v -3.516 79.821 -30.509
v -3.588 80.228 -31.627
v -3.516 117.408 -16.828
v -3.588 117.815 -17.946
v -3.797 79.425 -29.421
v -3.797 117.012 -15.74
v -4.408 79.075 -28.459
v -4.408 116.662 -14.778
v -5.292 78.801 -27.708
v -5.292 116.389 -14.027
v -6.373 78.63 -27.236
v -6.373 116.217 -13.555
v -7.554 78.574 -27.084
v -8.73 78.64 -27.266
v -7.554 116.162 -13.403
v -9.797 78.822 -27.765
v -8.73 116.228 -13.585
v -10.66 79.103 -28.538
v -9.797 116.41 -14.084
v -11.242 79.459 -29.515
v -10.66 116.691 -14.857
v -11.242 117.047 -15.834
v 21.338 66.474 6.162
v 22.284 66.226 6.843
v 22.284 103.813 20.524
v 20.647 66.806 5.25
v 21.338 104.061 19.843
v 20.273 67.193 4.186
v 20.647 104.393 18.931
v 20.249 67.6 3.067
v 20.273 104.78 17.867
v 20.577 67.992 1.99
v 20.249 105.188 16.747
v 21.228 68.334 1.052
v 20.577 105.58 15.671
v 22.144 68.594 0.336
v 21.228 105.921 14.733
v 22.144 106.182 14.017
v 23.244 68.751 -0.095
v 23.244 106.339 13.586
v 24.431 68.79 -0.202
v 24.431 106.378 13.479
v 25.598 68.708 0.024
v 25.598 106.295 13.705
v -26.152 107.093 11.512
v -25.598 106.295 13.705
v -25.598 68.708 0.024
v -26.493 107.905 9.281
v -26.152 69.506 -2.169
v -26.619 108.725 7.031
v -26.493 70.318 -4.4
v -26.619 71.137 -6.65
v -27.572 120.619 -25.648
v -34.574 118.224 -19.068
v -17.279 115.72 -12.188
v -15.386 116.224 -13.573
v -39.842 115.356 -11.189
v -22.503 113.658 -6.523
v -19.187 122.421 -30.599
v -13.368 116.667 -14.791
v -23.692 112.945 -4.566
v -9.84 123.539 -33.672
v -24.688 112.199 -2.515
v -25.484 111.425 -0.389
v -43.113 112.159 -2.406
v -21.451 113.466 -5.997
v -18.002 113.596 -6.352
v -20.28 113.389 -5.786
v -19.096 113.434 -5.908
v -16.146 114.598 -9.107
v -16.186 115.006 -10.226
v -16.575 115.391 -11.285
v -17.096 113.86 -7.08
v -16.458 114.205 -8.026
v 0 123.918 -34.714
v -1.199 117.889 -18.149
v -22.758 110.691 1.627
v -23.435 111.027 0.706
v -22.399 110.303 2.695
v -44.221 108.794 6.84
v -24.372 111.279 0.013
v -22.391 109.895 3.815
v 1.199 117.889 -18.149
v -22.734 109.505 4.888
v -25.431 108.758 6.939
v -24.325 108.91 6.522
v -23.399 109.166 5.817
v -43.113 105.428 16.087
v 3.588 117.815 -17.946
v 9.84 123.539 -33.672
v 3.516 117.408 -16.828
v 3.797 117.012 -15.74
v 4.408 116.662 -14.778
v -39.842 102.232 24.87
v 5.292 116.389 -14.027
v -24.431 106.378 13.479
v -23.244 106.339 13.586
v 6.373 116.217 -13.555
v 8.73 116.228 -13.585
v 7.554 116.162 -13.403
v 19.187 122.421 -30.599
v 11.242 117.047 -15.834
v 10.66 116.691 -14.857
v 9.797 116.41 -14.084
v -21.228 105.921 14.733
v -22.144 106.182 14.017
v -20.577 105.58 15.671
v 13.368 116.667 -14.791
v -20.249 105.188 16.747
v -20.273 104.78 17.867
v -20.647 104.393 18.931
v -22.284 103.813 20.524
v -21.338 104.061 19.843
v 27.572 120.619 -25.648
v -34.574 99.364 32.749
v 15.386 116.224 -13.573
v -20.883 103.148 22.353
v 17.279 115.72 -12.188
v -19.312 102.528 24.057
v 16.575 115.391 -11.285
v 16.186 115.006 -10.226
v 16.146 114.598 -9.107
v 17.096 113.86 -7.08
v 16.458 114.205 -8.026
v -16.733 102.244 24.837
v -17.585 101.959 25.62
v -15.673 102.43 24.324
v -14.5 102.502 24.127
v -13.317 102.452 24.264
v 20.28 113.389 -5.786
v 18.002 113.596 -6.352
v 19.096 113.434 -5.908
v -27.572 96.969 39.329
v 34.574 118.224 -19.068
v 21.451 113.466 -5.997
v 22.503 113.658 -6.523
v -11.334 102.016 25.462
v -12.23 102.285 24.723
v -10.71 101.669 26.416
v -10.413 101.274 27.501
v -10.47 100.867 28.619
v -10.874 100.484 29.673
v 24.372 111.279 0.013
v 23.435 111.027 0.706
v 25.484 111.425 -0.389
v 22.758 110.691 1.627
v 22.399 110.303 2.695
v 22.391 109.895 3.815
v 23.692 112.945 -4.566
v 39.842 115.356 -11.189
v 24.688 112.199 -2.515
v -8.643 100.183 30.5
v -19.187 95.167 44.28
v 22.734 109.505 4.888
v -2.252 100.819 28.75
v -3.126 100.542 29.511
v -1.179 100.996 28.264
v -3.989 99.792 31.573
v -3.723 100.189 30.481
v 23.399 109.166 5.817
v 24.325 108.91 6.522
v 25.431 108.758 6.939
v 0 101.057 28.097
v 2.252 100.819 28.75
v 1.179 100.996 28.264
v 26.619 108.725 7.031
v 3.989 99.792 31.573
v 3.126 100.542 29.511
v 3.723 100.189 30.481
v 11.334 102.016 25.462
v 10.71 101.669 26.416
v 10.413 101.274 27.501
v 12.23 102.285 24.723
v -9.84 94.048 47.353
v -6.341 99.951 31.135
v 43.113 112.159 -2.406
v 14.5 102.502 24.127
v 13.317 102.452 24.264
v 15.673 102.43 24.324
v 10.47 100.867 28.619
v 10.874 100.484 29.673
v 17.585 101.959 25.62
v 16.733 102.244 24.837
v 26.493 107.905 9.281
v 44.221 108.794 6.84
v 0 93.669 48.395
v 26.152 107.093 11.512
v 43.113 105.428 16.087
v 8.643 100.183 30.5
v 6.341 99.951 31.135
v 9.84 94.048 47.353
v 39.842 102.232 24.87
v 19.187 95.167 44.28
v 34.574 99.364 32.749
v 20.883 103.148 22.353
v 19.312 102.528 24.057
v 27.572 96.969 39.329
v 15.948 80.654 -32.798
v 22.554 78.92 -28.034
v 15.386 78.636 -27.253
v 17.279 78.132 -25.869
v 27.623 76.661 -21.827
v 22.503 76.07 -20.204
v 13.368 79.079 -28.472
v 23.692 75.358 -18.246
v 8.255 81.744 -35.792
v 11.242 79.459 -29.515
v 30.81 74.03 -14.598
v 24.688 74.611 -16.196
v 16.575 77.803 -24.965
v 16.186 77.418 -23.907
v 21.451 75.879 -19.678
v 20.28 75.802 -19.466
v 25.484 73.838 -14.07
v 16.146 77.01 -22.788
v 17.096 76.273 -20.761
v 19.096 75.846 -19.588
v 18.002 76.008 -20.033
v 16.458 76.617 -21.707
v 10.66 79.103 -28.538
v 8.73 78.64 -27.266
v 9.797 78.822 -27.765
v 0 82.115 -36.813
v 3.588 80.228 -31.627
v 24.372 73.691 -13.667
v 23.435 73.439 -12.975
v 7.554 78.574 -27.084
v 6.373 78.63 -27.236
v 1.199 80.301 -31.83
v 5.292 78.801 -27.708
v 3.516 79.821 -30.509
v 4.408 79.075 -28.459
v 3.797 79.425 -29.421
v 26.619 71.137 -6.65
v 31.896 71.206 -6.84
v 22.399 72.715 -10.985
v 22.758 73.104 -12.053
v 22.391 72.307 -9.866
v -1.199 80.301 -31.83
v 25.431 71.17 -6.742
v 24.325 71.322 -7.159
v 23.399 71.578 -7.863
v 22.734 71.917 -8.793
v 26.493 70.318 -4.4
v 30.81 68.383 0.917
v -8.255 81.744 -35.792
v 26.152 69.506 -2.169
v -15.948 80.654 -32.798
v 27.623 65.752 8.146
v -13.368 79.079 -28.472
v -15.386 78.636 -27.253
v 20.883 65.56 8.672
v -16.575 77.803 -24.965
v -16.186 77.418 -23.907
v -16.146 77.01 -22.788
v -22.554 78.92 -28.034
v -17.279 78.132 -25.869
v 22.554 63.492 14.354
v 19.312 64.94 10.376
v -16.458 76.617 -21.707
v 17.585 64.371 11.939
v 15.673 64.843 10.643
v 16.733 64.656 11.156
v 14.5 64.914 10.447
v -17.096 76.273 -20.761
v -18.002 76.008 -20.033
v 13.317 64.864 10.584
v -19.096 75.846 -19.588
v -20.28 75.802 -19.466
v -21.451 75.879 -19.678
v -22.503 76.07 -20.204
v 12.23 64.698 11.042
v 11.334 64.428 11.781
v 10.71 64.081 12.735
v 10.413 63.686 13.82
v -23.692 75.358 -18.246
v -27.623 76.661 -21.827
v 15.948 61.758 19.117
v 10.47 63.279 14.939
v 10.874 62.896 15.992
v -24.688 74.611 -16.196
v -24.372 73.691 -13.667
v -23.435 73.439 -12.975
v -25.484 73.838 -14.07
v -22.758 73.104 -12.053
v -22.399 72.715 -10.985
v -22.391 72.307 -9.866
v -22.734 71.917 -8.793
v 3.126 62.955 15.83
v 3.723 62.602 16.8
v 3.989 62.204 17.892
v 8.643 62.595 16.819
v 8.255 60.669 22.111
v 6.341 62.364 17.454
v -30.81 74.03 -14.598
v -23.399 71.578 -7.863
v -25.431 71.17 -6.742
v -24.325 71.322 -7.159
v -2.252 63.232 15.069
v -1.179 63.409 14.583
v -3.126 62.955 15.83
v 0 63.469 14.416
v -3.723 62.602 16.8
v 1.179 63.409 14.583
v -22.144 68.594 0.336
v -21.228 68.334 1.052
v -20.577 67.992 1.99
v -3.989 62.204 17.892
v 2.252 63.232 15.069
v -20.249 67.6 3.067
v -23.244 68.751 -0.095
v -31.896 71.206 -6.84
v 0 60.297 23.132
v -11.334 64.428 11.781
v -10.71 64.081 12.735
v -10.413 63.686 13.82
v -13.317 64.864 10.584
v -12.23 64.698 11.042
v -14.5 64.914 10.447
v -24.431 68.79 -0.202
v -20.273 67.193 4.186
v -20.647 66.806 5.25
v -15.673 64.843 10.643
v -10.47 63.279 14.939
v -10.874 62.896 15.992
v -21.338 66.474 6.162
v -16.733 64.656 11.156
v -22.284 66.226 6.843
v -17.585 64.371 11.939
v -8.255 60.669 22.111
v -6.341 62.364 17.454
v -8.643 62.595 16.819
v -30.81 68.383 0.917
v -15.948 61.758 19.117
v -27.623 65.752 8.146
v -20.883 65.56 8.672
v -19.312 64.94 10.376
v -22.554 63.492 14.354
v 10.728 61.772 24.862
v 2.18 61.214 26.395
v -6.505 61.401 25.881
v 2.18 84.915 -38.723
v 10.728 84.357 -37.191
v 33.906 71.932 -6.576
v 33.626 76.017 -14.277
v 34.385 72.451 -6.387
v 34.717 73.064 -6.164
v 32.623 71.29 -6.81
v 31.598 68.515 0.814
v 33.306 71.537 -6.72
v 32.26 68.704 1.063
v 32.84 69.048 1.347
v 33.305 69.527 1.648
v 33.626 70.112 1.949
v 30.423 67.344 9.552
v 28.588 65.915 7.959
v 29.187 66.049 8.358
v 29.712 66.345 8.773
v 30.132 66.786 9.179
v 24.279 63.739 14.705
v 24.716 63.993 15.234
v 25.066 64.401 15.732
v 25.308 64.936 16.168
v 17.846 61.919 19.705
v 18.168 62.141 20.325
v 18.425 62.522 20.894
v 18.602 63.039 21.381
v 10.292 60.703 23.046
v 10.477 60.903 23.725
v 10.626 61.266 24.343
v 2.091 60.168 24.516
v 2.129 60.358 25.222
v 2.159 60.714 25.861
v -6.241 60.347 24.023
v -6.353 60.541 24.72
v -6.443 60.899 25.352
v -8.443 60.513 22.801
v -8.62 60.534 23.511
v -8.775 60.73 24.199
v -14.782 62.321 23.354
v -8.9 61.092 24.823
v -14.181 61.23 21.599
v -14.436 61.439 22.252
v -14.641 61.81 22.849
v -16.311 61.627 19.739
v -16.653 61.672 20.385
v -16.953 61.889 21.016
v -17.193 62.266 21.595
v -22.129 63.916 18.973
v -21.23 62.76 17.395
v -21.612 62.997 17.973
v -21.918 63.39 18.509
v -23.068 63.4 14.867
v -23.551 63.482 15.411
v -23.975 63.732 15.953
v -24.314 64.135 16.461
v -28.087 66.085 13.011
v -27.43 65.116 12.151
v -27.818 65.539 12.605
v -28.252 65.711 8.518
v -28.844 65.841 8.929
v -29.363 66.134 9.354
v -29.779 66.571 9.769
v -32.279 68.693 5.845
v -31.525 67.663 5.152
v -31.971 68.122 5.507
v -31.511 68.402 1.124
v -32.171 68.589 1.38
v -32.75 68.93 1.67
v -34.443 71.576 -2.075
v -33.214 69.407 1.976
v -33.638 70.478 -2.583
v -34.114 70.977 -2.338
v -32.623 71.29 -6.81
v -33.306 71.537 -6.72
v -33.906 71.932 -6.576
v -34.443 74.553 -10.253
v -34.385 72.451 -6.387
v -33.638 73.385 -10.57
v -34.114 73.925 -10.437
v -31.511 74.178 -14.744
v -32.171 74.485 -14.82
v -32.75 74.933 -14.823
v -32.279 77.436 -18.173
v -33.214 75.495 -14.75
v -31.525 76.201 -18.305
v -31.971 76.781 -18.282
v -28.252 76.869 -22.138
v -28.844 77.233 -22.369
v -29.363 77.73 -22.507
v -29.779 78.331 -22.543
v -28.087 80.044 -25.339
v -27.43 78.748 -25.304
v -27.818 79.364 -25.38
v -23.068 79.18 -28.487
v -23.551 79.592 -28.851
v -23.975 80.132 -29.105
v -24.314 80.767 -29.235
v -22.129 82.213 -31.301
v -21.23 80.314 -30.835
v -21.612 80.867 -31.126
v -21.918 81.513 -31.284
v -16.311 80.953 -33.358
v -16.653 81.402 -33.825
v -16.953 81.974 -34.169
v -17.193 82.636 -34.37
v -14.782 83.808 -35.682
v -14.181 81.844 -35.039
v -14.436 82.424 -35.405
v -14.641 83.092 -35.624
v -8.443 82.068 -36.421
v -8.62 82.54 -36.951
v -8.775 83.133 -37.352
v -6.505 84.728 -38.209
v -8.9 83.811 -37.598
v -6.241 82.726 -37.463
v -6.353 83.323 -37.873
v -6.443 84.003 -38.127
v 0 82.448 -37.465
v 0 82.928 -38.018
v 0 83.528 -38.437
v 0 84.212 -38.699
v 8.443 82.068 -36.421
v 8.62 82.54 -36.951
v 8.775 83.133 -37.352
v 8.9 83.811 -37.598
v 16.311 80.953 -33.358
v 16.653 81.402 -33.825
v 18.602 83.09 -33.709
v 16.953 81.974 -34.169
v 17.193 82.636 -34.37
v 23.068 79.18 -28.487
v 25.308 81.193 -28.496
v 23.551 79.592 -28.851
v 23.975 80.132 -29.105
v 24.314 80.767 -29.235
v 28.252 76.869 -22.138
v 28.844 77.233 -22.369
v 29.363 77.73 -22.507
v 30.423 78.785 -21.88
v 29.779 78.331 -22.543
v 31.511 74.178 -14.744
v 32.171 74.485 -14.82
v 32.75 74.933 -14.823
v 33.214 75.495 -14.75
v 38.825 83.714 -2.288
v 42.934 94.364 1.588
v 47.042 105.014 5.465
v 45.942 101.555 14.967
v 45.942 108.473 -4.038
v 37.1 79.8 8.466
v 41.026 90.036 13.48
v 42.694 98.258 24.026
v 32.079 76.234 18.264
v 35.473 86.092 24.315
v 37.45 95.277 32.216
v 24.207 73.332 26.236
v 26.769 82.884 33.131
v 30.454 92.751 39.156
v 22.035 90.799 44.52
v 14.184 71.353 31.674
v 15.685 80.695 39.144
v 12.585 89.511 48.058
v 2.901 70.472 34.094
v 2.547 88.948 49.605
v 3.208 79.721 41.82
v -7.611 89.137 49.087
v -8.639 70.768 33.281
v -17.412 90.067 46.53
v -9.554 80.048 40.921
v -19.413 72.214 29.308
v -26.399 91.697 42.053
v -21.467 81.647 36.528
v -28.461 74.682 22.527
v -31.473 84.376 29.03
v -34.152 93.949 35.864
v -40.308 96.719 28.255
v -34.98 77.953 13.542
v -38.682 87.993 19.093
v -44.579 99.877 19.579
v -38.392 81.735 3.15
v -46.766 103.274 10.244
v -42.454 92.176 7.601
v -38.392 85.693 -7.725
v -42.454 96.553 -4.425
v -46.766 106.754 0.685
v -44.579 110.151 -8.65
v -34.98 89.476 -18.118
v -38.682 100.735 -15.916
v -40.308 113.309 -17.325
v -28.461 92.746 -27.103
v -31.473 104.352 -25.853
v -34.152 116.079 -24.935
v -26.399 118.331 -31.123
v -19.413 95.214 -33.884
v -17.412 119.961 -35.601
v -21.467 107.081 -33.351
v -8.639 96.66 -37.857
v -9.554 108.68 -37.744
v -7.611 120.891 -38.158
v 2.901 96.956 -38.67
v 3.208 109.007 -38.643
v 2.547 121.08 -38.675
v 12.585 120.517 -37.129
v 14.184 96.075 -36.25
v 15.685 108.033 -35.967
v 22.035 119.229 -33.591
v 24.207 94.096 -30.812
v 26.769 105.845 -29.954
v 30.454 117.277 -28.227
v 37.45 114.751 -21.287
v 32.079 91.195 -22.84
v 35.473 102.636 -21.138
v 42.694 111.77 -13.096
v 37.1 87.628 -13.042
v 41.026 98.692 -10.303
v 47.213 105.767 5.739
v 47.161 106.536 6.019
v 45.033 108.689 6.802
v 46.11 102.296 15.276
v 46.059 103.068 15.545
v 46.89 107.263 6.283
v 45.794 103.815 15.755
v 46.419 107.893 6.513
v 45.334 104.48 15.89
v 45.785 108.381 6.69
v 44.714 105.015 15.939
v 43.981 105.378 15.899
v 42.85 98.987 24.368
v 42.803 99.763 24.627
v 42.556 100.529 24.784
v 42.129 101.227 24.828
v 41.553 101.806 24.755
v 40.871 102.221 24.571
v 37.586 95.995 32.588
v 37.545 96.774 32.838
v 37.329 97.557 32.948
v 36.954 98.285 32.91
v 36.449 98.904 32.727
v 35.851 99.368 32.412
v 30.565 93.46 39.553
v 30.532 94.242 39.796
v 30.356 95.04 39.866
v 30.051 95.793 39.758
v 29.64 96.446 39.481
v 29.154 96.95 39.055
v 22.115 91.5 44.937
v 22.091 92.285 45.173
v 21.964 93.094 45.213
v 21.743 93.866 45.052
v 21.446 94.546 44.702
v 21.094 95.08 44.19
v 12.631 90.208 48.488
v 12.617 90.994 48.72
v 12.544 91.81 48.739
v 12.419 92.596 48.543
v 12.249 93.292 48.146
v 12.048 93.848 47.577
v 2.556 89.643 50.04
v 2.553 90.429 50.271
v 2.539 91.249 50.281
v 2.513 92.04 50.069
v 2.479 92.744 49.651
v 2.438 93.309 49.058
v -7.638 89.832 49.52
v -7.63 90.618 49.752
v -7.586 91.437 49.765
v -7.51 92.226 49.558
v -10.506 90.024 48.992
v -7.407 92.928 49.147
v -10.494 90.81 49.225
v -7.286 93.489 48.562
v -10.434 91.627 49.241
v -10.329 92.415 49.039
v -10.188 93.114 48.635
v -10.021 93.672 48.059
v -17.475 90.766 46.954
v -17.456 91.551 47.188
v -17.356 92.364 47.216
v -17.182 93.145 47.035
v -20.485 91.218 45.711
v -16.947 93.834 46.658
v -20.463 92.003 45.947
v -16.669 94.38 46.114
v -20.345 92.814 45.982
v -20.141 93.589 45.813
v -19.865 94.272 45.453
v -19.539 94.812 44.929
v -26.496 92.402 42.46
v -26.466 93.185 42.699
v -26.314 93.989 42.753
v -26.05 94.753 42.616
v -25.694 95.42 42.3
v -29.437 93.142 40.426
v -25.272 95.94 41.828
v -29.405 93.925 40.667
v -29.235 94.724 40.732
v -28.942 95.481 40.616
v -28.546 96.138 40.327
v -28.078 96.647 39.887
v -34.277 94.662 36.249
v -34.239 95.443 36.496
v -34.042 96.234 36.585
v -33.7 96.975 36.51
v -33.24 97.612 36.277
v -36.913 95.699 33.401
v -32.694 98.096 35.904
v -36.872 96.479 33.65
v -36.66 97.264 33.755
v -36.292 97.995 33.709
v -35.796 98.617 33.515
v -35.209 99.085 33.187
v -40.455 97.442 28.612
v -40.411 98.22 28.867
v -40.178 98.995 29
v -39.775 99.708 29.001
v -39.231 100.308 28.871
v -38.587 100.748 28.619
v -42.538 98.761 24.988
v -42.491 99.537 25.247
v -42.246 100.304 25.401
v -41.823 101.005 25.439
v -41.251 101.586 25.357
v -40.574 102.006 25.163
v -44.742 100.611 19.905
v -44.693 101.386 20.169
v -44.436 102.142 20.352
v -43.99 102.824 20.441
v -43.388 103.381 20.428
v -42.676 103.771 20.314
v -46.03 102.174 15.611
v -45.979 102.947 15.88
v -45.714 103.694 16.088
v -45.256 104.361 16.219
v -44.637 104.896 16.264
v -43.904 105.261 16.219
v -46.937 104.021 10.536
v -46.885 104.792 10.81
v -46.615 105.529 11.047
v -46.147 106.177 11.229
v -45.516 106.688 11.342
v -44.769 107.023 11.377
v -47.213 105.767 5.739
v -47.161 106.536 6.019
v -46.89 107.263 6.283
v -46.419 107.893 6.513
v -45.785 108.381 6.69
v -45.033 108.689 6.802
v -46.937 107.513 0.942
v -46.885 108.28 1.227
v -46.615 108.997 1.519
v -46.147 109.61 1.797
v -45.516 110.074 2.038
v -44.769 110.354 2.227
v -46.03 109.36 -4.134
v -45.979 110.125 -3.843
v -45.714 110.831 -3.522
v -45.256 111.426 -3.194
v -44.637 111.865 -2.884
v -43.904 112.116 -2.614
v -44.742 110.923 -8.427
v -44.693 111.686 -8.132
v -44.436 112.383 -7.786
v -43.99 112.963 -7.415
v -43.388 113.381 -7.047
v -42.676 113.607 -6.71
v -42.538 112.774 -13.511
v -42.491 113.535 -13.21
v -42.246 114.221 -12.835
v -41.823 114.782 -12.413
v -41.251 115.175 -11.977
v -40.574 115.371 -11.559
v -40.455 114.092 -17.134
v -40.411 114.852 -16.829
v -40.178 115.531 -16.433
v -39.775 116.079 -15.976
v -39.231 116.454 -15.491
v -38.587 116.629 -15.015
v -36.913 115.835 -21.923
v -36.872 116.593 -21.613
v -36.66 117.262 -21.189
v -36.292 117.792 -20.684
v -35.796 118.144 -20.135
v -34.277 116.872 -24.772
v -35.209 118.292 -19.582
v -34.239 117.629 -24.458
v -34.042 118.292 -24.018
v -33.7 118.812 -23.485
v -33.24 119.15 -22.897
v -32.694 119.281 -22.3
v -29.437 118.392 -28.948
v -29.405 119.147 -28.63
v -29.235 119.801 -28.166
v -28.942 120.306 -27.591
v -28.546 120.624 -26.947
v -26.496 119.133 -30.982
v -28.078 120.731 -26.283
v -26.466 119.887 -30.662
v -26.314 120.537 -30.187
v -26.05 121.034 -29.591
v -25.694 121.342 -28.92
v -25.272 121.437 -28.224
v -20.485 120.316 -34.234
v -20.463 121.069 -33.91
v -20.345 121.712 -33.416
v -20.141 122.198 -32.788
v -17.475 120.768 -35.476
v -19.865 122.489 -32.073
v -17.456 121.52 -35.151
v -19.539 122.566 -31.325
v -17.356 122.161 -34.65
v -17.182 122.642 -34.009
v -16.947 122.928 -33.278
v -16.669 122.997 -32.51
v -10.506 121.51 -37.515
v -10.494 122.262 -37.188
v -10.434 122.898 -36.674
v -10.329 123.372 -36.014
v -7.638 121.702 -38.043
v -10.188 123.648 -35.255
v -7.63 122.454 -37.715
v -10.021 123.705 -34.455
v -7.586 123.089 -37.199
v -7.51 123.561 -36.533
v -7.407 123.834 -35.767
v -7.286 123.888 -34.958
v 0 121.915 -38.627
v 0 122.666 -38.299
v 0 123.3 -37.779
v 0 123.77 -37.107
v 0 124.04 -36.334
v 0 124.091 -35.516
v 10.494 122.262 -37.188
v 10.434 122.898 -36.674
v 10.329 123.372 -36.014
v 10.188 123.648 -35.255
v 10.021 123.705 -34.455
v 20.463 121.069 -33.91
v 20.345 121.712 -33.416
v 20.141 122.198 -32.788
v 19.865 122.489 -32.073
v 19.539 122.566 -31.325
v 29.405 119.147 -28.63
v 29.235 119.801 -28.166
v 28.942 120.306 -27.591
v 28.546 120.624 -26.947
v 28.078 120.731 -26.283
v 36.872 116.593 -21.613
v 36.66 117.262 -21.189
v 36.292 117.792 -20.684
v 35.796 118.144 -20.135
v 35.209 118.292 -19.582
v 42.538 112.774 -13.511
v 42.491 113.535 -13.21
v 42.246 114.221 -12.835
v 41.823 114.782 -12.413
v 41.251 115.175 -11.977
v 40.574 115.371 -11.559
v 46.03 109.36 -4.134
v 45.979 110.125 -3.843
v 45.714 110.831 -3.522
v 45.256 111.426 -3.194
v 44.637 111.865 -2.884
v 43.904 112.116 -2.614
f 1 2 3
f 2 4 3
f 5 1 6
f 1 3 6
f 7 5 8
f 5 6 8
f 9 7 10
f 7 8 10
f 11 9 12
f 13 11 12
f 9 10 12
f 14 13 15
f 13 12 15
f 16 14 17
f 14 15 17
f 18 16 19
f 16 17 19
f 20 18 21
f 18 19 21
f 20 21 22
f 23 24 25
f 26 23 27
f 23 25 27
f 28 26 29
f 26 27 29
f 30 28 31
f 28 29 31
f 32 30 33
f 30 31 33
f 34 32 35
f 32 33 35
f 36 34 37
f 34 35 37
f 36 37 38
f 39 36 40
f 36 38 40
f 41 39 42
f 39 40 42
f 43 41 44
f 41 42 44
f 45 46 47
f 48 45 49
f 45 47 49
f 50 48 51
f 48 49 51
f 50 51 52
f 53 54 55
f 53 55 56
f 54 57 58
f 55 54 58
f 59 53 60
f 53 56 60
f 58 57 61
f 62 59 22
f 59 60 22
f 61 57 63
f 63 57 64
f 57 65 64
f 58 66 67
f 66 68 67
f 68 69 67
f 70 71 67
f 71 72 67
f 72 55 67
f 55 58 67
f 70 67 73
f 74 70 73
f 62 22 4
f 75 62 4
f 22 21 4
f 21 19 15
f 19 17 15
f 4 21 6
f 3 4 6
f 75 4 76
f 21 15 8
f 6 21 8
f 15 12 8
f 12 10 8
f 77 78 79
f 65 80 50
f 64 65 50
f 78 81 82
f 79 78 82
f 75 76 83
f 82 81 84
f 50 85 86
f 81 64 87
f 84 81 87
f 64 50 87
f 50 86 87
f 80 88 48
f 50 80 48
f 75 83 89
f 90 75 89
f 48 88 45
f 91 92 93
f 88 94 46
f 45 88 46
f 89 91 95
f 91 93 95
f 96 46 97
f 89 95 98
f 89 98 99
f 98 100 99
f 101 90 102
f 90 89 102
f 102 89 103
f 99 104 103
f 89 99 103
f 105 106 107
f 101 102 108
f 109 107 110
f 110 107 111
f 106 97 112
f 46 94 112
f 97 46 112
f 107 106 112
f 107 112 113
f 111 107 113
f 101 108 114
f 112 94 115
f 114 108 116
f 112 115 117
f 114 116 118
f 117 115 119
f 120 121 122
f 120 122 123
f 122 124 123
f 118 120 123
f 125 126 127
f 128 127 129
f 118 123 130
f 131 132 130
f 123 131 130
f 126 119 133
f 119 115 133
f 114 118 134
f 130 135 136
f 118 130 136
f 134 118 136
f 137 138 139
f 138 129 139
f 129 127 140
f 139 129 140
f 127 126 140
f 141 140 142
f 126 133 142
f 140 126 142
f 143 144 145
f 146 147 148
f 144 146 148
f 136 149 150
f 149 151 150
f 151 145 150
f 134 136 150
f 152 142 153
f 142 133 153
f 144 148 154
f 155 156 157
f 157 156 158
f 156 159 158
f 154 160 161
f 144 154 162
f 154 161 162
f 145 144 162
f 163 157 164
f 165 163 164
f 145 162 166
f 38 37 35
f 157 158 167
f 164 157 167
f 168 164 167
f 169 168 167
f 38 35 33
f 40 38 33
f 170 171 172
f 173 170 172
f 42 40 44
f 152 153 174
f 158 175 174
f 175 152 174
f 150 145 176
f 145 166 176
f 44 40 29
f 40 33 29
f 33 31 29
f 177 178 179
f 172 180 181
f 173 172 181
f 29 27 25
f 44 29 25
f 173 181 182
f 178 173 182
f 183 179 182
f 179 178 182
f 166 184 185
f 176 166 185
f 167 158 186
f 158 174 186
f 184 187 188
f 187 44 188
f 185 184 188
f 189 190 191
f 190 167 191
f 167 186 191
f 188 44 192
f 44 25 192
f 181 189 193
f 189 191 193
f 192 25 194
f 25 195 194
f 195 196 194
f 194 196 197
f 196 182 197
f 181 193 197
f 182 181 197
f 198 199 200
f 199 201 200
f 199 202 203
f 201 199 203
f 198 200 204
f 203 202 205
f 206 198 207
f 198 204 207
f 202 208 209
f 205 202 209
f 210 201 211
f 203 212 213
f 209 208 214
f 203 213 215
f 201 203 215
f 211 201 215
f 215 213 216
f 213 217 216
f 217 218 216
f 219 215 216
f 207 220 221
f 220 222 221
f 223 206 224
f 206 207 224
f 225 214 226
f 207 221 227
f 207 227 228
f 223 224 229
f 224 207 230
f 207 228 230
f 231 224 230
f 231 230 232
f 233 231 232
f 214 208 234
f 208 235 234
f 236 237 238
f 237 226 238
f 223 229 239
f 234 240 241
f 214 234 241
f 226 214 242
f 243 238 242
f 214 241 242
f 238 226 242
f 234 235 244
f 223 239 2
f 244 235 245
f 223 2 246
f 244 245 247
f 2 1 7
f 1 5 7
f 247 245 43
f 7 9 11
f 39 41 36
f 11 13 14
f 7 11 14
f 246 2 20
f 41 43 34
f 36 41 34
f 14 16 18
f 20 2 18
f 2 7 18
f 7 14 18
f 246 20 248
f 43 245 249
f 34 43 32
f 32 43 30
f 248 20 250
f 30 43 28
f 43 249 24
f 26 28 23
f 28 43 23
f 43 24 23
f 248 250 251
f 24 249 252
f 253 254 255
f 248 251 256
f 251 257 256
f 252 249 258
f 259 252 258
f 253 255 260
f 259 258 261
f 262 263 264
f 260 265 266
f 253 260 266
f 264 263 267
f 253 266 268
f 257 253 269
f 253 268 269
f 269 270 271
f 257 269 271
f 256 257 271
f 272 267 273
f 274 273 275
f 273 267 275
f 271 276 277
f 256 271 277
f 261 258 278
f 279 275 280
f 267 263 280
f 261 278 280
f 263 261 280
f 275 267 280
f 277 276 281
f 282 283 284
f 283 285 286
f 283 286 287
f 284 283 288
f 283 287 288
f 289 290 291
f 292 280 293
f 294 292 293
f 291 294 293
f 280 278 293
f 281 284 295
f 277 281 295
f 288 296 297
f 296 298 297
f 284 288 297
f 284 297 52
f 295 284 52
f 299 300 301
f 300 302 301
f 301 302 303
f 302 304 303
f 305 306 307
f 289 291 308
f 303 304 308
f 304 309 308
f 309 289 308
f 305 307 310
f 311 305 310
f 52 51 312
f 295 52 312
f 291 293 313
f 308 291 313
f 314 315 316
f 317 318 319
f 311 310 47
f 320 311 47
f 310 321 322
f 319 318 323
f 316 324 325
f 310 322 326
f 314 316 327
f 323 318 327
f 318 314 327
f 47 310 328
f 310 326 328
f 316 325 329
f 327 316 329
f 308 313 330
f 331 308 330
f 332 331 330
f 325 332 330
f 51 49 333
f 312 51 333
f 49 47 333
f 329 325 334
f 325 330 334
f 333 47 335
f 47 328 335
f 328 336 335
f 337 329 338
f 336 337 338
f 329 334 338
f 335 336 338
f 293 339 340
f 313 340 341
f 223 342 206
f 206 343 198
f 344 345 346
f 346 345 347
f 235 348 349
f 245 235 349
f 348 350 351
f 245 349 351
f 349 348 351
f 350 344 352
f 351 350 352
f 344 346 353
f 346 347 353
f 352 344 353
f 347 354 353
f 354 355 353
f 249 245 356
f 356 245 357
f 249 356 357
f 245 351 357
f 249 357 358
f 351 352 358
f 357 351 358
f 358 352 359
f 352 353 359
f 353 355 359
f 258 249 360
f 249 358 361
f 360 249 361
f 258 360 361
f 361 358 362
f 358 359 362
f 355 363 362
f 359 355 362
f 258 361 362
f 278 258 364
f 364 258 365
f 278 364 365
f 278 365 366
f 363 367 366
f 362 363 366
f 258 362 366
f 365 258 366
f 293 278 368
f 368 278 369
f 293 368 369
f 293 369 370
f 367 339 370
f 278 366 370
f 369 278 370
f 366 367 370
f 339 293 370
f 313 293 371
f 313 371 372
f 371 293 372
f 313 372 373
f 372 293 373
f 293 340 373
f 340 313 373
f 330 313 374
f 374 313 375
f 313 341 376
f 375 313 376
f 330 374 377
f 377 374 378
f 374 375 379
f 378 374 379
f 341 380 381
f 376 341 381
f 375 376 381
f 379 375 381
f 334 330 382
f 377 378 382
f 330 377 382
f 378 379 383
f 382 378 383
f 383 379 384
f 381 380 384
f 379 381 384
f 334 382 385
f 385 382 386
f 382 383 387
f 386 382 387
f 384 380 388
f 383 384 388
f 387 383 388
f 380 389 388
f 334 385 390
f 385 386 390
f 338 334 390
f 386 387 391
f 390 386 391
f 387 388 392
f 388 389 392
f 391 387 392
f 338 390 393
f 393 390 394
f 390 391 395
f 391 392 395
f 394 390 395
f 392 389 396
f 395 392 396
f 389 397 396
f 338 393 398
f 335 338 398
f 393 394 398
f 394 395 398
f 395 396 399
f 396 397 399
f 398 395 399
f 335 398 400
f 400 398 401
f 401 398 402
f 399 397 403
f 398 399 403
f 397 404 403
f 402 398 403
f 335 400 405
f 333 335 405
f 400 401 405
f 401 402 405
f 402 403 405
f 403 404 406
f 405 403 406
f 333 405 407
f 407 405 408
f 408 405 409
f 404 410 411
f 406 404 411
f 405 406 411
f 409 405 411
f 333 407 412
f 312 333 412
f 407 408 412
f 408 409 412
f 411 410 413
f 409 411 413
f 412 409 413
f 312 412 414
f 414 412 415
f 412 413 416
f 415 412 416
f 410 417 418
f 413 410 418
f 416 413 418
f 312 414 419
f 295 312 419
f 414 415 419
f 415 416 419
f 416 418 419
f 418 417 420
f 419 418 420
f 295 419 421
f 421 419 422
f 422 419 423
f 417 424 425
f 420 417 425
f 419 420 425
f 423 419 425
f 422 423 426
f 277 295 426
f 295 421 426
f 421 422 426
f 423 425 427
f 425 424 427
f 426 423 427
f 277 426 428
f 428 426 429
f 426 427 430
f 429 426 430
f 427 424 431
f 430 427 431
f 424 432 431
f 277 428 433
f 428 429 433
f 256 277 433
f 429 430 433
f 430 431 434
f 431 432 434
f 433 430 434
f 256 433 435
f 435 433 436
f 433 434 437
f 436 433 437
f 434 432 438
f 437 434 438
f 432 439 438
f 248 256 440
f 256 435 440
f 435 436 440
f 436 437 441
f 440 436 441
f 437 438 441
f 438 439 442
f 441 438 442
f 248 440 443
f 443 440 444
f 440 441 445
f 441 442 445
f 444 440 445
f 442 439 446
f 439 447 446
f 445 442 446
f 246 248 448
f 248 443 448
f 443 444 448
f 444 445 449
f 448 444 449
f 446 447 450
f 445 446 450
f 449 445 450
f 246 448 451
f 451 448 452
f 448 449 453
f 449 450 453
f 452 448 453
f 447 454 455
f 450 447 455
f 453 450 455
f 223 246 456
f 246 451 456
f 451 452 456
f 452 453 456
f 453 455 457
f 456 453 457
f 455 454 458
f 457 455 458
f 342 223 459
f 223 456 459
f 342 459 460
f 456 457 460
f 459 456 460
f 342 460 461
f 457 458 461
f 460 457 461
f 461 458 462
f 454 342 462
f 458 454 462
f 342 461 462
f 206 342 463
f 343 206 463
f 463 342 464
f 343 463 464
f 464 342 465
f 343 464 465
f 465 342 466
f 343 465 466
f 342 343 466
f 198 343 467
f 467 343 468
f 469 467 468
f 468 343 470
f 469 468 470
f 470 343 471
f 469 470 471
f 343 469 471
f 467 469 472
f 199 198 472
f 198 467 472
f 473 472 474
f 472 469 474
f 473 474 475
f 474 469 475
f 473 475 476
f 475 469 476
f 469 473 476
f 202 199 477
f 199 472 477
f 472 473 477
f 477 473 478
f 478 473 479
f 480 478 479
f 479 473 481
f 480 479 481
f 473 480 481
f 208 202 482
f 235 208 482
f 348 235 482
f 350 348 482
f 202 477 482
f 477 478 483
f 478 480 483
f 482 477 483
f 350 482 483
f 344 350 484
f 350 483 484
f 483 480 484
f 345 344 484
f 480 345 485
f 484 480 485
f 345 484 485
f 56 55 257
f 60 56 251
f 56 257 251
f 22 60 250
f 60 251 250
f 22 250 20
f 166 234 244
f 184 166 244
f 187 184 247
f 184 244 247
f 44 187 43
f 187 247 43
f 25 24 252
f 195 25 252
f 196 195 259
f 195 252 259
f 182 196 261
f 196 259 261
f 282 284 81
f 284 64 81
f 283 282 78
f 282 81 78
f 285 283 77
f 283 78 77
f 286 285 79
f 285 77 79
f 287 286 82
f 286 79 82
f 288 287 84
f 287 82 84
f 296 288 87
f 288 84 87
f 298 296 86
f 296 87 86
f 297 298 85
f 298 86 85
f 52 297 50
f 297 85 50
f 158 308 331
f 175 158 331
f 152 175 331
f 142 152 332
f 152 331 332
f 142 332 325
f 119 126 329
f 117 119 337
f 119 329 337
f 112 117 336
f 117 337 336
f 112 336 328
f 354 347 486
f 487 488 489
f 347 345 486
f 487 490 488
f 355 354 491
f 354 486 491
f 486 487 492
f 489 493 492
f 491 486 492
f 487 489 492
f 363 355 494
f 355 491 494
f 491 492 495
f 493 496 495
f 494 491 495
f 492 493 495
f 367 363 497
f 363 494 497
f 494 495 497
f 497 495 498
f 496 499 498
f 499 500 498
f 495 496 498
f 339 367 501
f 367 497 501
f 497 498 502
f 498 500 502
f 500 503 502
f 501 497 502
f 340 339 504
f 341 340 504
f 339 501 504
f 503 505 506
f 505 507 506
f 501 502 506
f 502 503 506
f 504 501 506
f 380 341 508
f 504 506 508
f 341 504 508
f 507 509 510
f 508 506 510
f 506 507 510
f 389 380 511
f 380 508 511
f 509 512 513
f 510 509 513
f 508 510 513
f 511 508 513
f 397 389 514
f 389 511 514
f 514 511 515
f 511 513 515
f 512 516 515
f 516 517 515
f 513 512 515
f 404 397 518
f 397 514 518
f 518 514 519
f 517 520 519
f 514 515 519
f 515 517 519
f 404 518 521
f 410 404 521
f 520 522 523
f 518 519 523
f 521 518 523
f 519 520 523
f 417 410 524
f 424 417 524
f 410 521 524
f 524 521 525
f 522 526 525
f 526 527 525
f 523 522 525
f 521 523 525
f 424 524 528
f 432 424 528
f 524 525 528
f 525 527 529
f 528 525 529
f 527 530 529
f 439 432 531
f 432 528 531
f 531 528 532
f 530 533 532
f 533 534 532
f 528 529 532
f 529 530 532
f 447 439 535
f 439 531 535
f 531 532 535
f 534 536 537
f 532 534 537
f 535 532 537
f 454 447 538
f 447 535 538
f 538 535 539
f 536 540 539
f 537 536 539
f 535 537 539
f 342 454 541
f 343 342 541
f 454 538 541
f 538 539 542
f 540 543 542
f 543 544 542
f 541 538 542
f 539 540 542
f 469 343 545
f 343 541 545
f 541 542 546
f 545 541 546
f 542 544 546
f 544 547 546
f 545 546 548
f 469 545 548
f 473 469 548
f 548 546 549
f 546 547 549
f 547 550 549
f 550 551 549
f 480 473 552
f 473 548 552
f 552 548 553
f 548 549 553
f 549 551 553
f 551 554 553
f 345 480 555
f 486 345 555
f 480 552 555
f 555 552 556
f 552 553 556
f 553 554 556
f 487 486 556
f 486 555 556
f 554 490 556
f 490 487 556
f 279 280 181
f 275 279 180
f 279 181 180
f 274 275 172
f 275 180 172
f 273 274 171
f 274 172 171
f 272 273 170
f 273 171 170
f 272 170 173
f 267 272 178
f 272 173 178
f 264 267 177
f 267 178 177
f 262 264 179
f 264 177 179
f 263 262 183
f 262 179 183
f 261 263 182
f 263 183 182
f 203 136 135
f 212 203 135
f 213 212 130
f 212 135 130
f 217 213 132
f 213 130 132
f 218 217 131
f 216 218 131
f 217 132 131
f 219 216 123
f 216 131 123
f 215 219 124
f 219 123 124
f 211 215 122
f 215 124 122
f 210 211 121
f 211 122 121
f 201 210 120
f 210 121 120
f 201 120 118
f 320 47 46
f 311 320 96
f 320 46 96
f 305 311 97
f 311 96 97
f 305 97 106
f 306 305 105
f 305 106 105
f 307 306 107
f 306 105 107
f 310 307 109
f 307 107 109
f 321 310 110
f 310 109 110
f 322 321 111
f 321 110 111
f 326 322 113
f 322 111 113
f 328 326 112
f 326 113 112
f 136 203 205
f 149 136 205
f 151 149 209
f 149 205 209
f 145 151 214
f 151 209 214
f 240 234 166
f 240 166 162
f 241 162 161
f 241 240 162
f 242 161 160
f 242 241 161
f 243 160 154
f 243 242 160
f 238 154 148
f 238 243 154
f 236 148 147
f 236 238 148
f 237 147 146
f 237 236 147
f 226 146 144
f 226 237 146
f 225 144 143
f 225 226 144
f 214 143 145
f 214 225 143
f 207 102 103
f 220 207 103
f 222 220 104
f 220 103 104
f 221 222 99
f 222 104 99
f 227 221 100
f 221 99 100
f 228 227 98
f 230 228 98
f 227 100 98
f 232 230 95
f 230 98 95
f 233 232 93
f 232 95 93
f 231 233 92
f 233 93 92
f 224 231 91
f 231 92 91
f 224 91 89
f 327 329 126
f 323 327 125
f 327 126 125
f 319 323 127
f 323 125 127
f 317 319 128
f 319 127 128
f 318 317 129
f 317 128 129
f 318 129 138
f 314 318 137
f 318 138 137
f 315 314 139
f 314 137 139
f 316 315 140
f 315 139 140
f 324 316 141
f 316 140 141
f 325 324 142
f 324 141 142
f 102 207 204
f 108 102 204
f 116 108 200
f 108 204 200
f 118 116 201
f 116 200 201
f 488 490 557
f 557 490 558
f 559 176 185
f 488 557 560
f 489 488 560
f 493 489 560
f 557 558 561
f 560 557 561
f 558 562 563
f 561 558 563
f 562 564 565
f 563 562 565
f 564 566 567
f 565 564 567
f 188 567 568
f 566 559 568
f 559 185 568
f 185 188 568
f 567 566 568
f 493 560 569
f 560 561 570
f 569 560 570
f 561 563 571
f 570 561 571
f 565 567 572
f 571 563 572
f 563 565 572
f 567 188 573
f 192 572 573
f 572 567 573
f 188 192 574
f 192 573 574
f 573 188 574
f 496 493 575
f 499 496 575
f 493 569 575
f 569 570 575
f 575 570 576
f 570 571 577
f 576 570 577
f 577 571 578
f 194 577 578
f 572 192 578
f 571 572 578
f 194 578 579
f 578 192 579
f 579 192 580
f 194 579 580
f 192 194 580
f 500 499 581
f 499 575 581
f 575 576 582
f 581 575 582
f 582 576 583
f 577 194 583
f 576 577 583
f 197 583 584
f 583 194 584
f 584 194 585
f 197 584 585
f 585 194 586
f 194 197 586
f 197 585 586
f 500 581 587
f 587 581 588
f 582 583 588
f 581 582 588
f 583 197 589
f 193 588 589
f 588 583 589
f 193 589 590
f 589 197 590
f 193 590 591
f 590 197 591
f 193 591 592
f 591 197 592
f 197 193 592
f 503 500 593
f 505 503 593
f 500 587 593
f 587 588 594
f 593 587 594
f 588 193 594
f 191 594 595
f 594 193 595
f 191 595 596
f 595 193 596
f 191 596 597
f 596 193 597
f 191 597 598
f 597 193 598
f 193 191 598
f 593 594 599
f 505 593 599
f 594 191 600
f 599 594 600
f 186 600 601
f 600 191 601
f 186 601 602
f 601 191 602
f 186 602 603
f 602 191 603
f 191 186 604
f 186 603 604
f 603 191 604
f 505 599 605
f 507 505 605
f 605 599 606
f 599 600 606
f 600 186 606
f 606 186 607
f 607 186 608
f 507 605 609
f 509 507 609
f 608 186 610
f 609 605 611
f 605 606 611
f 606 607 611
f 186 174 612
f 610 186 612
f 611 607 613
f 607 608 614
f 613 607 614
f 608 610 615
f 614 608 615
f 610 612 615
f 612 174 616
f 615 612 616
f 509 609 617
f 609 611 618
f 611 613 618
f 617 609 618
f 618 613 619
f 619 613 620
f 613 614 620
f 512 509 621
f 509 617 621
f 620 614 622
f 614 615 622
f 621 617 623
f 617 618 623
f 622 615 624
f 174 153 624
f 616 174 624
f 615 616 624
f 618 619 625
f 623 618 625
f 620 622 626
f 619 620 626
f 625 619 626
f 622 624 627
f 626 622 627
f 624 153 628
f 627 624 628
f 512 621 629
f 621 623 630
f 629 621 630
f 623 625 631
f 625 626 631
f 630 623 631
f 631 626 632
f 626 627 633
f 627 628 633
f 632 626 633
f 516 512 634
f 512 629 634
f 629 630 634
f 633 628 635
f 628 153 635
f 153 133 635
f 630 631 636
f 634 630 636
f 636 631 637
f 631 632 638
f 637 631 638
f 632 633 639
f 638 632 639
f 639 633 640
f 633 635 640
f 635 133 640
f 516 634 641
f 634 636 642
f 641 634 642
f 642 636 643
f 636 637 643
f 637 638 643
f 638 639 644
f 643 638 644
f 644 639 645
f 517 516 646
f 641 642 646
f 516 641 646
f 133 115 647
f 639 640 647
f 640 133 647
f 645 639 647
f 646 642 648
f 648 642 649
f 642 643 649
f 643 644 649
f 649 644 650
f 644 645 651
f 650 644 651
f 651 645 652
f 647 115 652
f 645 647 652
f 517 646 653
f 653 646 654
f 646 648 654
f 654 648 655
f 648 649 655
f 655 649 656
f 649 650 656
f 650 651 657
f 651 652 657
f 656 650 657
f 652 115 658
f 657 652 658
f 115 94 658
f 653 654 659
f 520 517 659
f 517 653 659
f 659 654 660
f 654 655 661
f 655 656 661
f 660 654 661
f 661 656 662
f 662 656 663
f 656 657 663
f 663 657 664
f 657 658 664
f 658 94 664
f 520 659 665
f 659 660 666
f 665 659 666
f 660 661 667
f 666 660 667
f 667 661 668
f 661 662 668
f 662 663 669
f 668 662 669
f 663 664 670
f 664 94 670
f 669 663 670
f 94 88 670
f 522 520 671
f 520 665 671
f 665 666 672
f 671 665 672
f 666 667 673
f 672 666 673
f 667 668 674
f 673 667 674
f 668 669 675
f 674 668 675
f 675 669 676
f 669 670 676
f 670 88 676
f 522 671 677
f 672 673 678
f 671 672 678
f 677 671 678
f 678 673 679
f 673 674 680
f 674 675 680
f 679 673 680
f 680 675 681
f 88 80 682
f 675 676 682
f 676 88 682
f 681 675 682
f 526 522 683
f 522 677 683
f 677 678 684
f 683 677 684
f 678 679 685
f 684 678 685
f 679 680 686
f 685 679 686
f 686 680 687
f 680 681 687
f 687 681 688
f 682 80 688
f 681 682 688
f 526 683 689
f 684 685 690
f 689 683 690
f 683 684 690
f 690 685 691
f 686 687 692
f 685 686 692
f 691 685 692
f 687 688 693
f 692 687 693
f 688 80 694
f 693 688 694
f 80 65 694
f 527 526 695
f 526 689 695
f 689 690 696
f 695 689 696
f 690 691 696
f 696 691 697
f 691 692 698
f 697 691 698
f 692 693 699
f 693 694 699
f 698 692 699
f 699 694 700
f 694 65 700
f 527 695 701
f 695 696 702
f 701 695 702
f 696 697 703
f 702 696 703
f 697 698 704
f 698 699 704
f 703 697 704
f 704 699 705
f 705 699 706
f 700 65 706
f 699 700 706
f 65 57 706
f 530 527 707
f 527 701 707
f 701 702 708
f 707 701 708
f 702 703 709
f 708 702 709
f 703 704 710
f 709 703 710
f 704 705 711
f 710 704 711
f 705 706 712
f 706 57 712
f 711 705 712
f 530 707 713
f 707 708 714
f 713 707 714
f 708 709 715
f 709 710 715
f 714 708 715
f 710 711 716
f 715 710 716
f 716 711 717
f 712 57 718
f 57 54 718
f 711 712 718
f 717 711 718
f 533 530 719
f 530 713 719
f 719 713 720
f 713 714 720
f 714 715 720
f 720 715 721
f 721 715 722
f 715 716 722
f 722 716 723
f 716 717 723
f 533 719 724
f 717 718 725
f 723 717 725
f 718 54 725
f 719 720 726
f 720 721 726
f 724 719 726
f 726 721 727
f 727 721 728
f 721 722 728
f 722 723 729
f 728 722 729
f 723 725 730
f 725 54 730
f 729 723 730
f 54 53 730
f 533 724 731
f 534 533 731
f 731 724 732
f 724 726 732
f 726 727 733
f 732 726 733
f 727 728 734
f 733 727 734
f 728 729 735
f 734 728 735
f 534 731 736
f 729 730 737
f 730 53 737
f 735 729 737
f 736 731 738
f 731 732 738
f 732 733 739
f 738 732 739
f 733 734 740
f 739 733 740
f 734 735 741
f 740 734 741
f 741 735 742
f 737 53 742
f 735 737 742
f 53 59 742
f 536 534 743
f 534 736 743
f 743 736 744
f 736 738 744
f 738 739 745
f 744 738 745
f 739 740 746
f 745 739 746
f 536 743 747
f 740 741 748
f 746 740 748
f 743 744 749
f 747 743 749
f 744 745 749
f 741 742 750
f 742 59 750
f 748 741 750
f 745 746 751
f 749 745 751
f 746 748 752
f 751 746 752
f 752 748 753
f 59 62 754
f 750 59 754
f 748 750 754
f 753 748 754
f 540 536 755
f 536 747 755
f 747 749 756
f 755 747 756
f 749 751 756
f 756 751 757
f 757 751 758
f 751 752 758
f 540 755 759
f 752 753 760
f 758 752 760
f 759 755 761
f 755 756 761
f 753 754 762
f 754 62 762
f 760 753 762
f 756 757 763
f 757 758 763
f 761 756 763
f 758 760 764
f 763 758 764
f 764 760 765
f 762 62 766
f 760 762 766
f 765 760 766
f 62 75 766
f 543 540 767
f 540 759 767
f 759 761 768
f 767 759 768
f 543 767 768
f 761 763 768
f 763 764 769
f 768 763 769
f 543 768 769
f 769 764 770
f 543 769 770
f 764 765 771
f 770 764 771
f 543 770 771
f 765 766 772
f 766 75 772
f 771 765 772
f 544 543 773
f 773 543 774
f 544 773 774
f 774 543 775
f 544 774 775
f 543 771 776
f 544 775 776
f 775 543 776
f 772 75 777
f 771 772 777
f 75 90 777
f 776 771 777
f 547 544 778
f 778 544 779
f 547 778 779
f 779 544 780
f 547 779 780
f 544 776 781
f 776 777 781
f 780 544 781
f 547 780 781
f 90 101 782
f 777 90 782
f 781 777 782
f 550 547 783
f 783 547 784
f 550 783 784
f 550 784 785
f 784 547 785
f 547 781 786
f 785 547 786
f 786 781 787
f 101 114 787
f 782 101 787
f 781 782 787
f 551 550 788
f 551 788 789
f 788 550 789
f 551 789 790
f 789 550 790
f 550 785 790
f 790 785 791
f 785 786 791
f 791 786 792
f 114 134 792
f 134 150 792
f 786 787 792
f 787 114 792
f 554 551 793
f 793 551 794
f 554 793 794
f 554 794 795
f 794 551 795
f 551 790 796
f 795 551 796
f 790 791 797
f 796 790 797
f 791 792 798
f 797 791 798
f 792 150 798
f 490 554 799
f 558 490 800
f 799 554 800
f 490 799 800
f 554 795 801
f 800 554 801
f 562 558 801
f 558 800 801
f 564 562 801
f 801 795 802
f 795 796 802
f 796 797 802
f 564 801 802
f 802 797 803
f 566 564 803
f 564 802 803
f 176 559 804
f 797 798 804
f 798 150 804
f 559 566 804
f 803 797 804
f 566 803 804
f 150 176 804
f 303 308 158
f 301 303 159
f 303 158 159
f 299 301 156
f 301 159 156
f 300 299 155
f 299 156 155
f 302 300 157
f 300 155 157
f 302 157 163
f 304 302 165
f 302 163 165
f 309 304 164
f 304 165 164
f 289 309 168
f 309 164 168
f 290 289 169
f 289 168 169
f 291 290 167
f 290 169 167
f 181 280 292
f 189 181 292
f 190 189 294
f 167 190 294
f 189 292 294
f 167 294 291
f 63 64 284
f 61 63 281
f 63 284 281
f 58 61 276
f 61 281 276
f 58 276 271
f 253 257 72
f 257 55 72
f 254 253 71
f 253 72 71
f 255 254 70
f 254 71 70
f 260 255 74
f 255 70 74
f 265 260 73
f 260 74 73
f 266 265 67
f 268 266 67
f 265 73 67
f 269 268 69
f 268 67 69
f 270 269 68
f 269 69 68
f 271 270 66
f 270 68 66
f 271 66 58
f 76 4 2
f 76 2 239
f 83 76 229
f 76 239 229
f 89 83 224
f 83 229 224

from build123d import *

# Parameters (mm, degrees)
SKETCH_R             = 4
PAD_DEPTH            = 20
CYLINDER_R           = 26.62
CYLINDER_DEPTH       = 40
CYLINDER_ROLL_ANGLE  = 90.0000000001
CUT007_ROLL_ANGLE    = -20
CONE_PLACEMENT_ANGLE = 70
FILLET007_R          = 3


with BuildPart() as clone_of_pad:
    # Sketch → Pad (new body, symmetric)
    with BuildSketch(Plane.XZ):
        with Locations((0, 26.6209914966)):
            Circle(SKETCH_R)
        with Locations((14.3923946042, 22.395003144)):
            Circle(SKETCH_R)
        with Locations((24.2153056134, 11.0587595287)):
            Circle(SKETCH_R)
        with Locations((26.3500281875, -3.7885620995)):
            Circle(SKETCH_R)
        with Locations((20.1188029925, -17.4330420298)):
            Circle(SKETCH_R)
        with Locations((7.5, -25.5426542917)):
            Circle(SKETCH_R)
        with Locations((-7.5, -25.5426542917)):
            Circle(SKETCH_R)
        with Locations((-26.3500281875, -3.7885620995)):
            Circle(SKETCH_R)
        with Locations((-24.2153056134, 11.0587595287)):
            Circle(SKETCH_R)
        with Locations((-14.3923946042, 22.395003144)):
            Circle(SKETCH_R)
        with Locations((-20.1188029925, -17.4330420298)):
            Circle(SKETCH_R)
    extrude(amount=PAD_DEPTH, both=True)


with BuildPart() as cut007:
    # Cylinder → Cylinder (new body)
    with BuildSketch(Plane.XY):
        Circle(CYLINDER_R)
    extrude(amount=CYLINDER_DEPTH)


with BuildPart() as cut007_1:
    # Cylinder roll: moved
    add(cut007.part.rotate(Axis((0, 0, 0), (1, 0, 0)), CYLINDER_ROLL_ANGLE))


with BuildPart() as cut007_2:
    # Cylinder placement: moved
    add(cut007_1.part.moved(Location((0, 20, 0))))

    # Cut007: cut Clone of Pad
    add(clone_of_pad.part, mode=Mode.SUBTRACT)


with BuildPart() as cut007_3:
    # Cut007 roll: moved
    add(cut007_2.part.rotate(Axis((0, 0, 0), (1, 0, 0)), CUT007_ROLL_ANGLE))


with BuildPart() as cut007_4:
    # Cut007 placement: moved
    add(cut007_3.part)


with BuildPart() as fillet007:
    # Cone → Cone (revolve)
    with BuildSketch(Plane.XZ):
        Polygon((0, 0), (34, 0), (48.5, 40), (0, 40), align=None)
    revolve(axis=Axis((0, 0, 0), (0, 0, 1)))


with BuildPart() as fillet007_1:
    # Cone placement: moved
    add(fillet007.part.moved(Location((0, 18.7938524157, -6.8404028665))).rotate(Axis((0, 18.7938524157, -6.8404028665), (1, 0, 0)), CONE_PLACEMENT_ANGLE))

    # Cut008: cut Cut007
    add(cut007_4.part, mode=Mode.SUBTRACT)

    # Fillet007
    fillet007_edges = [fillet007_1.edges().sort_by_distance(p)[0] for p in [
        (-48.5, -18.793852, 6.840403),
        (-34, 18.793852, -6.840403),
    ]]
    fillet(fillet007_edges, radius=FILLET007_R)


with BuildPart() as part_mirroring005:
    # Part__Mirroring005: instance of Fillet007
    add(fillet007_1.part.mirror(Plane(origin=(0, 45, 0), x_dir=(1, 0, 0), z_dir=(0, 1, 0))))


solid = part_mirroring005.part
